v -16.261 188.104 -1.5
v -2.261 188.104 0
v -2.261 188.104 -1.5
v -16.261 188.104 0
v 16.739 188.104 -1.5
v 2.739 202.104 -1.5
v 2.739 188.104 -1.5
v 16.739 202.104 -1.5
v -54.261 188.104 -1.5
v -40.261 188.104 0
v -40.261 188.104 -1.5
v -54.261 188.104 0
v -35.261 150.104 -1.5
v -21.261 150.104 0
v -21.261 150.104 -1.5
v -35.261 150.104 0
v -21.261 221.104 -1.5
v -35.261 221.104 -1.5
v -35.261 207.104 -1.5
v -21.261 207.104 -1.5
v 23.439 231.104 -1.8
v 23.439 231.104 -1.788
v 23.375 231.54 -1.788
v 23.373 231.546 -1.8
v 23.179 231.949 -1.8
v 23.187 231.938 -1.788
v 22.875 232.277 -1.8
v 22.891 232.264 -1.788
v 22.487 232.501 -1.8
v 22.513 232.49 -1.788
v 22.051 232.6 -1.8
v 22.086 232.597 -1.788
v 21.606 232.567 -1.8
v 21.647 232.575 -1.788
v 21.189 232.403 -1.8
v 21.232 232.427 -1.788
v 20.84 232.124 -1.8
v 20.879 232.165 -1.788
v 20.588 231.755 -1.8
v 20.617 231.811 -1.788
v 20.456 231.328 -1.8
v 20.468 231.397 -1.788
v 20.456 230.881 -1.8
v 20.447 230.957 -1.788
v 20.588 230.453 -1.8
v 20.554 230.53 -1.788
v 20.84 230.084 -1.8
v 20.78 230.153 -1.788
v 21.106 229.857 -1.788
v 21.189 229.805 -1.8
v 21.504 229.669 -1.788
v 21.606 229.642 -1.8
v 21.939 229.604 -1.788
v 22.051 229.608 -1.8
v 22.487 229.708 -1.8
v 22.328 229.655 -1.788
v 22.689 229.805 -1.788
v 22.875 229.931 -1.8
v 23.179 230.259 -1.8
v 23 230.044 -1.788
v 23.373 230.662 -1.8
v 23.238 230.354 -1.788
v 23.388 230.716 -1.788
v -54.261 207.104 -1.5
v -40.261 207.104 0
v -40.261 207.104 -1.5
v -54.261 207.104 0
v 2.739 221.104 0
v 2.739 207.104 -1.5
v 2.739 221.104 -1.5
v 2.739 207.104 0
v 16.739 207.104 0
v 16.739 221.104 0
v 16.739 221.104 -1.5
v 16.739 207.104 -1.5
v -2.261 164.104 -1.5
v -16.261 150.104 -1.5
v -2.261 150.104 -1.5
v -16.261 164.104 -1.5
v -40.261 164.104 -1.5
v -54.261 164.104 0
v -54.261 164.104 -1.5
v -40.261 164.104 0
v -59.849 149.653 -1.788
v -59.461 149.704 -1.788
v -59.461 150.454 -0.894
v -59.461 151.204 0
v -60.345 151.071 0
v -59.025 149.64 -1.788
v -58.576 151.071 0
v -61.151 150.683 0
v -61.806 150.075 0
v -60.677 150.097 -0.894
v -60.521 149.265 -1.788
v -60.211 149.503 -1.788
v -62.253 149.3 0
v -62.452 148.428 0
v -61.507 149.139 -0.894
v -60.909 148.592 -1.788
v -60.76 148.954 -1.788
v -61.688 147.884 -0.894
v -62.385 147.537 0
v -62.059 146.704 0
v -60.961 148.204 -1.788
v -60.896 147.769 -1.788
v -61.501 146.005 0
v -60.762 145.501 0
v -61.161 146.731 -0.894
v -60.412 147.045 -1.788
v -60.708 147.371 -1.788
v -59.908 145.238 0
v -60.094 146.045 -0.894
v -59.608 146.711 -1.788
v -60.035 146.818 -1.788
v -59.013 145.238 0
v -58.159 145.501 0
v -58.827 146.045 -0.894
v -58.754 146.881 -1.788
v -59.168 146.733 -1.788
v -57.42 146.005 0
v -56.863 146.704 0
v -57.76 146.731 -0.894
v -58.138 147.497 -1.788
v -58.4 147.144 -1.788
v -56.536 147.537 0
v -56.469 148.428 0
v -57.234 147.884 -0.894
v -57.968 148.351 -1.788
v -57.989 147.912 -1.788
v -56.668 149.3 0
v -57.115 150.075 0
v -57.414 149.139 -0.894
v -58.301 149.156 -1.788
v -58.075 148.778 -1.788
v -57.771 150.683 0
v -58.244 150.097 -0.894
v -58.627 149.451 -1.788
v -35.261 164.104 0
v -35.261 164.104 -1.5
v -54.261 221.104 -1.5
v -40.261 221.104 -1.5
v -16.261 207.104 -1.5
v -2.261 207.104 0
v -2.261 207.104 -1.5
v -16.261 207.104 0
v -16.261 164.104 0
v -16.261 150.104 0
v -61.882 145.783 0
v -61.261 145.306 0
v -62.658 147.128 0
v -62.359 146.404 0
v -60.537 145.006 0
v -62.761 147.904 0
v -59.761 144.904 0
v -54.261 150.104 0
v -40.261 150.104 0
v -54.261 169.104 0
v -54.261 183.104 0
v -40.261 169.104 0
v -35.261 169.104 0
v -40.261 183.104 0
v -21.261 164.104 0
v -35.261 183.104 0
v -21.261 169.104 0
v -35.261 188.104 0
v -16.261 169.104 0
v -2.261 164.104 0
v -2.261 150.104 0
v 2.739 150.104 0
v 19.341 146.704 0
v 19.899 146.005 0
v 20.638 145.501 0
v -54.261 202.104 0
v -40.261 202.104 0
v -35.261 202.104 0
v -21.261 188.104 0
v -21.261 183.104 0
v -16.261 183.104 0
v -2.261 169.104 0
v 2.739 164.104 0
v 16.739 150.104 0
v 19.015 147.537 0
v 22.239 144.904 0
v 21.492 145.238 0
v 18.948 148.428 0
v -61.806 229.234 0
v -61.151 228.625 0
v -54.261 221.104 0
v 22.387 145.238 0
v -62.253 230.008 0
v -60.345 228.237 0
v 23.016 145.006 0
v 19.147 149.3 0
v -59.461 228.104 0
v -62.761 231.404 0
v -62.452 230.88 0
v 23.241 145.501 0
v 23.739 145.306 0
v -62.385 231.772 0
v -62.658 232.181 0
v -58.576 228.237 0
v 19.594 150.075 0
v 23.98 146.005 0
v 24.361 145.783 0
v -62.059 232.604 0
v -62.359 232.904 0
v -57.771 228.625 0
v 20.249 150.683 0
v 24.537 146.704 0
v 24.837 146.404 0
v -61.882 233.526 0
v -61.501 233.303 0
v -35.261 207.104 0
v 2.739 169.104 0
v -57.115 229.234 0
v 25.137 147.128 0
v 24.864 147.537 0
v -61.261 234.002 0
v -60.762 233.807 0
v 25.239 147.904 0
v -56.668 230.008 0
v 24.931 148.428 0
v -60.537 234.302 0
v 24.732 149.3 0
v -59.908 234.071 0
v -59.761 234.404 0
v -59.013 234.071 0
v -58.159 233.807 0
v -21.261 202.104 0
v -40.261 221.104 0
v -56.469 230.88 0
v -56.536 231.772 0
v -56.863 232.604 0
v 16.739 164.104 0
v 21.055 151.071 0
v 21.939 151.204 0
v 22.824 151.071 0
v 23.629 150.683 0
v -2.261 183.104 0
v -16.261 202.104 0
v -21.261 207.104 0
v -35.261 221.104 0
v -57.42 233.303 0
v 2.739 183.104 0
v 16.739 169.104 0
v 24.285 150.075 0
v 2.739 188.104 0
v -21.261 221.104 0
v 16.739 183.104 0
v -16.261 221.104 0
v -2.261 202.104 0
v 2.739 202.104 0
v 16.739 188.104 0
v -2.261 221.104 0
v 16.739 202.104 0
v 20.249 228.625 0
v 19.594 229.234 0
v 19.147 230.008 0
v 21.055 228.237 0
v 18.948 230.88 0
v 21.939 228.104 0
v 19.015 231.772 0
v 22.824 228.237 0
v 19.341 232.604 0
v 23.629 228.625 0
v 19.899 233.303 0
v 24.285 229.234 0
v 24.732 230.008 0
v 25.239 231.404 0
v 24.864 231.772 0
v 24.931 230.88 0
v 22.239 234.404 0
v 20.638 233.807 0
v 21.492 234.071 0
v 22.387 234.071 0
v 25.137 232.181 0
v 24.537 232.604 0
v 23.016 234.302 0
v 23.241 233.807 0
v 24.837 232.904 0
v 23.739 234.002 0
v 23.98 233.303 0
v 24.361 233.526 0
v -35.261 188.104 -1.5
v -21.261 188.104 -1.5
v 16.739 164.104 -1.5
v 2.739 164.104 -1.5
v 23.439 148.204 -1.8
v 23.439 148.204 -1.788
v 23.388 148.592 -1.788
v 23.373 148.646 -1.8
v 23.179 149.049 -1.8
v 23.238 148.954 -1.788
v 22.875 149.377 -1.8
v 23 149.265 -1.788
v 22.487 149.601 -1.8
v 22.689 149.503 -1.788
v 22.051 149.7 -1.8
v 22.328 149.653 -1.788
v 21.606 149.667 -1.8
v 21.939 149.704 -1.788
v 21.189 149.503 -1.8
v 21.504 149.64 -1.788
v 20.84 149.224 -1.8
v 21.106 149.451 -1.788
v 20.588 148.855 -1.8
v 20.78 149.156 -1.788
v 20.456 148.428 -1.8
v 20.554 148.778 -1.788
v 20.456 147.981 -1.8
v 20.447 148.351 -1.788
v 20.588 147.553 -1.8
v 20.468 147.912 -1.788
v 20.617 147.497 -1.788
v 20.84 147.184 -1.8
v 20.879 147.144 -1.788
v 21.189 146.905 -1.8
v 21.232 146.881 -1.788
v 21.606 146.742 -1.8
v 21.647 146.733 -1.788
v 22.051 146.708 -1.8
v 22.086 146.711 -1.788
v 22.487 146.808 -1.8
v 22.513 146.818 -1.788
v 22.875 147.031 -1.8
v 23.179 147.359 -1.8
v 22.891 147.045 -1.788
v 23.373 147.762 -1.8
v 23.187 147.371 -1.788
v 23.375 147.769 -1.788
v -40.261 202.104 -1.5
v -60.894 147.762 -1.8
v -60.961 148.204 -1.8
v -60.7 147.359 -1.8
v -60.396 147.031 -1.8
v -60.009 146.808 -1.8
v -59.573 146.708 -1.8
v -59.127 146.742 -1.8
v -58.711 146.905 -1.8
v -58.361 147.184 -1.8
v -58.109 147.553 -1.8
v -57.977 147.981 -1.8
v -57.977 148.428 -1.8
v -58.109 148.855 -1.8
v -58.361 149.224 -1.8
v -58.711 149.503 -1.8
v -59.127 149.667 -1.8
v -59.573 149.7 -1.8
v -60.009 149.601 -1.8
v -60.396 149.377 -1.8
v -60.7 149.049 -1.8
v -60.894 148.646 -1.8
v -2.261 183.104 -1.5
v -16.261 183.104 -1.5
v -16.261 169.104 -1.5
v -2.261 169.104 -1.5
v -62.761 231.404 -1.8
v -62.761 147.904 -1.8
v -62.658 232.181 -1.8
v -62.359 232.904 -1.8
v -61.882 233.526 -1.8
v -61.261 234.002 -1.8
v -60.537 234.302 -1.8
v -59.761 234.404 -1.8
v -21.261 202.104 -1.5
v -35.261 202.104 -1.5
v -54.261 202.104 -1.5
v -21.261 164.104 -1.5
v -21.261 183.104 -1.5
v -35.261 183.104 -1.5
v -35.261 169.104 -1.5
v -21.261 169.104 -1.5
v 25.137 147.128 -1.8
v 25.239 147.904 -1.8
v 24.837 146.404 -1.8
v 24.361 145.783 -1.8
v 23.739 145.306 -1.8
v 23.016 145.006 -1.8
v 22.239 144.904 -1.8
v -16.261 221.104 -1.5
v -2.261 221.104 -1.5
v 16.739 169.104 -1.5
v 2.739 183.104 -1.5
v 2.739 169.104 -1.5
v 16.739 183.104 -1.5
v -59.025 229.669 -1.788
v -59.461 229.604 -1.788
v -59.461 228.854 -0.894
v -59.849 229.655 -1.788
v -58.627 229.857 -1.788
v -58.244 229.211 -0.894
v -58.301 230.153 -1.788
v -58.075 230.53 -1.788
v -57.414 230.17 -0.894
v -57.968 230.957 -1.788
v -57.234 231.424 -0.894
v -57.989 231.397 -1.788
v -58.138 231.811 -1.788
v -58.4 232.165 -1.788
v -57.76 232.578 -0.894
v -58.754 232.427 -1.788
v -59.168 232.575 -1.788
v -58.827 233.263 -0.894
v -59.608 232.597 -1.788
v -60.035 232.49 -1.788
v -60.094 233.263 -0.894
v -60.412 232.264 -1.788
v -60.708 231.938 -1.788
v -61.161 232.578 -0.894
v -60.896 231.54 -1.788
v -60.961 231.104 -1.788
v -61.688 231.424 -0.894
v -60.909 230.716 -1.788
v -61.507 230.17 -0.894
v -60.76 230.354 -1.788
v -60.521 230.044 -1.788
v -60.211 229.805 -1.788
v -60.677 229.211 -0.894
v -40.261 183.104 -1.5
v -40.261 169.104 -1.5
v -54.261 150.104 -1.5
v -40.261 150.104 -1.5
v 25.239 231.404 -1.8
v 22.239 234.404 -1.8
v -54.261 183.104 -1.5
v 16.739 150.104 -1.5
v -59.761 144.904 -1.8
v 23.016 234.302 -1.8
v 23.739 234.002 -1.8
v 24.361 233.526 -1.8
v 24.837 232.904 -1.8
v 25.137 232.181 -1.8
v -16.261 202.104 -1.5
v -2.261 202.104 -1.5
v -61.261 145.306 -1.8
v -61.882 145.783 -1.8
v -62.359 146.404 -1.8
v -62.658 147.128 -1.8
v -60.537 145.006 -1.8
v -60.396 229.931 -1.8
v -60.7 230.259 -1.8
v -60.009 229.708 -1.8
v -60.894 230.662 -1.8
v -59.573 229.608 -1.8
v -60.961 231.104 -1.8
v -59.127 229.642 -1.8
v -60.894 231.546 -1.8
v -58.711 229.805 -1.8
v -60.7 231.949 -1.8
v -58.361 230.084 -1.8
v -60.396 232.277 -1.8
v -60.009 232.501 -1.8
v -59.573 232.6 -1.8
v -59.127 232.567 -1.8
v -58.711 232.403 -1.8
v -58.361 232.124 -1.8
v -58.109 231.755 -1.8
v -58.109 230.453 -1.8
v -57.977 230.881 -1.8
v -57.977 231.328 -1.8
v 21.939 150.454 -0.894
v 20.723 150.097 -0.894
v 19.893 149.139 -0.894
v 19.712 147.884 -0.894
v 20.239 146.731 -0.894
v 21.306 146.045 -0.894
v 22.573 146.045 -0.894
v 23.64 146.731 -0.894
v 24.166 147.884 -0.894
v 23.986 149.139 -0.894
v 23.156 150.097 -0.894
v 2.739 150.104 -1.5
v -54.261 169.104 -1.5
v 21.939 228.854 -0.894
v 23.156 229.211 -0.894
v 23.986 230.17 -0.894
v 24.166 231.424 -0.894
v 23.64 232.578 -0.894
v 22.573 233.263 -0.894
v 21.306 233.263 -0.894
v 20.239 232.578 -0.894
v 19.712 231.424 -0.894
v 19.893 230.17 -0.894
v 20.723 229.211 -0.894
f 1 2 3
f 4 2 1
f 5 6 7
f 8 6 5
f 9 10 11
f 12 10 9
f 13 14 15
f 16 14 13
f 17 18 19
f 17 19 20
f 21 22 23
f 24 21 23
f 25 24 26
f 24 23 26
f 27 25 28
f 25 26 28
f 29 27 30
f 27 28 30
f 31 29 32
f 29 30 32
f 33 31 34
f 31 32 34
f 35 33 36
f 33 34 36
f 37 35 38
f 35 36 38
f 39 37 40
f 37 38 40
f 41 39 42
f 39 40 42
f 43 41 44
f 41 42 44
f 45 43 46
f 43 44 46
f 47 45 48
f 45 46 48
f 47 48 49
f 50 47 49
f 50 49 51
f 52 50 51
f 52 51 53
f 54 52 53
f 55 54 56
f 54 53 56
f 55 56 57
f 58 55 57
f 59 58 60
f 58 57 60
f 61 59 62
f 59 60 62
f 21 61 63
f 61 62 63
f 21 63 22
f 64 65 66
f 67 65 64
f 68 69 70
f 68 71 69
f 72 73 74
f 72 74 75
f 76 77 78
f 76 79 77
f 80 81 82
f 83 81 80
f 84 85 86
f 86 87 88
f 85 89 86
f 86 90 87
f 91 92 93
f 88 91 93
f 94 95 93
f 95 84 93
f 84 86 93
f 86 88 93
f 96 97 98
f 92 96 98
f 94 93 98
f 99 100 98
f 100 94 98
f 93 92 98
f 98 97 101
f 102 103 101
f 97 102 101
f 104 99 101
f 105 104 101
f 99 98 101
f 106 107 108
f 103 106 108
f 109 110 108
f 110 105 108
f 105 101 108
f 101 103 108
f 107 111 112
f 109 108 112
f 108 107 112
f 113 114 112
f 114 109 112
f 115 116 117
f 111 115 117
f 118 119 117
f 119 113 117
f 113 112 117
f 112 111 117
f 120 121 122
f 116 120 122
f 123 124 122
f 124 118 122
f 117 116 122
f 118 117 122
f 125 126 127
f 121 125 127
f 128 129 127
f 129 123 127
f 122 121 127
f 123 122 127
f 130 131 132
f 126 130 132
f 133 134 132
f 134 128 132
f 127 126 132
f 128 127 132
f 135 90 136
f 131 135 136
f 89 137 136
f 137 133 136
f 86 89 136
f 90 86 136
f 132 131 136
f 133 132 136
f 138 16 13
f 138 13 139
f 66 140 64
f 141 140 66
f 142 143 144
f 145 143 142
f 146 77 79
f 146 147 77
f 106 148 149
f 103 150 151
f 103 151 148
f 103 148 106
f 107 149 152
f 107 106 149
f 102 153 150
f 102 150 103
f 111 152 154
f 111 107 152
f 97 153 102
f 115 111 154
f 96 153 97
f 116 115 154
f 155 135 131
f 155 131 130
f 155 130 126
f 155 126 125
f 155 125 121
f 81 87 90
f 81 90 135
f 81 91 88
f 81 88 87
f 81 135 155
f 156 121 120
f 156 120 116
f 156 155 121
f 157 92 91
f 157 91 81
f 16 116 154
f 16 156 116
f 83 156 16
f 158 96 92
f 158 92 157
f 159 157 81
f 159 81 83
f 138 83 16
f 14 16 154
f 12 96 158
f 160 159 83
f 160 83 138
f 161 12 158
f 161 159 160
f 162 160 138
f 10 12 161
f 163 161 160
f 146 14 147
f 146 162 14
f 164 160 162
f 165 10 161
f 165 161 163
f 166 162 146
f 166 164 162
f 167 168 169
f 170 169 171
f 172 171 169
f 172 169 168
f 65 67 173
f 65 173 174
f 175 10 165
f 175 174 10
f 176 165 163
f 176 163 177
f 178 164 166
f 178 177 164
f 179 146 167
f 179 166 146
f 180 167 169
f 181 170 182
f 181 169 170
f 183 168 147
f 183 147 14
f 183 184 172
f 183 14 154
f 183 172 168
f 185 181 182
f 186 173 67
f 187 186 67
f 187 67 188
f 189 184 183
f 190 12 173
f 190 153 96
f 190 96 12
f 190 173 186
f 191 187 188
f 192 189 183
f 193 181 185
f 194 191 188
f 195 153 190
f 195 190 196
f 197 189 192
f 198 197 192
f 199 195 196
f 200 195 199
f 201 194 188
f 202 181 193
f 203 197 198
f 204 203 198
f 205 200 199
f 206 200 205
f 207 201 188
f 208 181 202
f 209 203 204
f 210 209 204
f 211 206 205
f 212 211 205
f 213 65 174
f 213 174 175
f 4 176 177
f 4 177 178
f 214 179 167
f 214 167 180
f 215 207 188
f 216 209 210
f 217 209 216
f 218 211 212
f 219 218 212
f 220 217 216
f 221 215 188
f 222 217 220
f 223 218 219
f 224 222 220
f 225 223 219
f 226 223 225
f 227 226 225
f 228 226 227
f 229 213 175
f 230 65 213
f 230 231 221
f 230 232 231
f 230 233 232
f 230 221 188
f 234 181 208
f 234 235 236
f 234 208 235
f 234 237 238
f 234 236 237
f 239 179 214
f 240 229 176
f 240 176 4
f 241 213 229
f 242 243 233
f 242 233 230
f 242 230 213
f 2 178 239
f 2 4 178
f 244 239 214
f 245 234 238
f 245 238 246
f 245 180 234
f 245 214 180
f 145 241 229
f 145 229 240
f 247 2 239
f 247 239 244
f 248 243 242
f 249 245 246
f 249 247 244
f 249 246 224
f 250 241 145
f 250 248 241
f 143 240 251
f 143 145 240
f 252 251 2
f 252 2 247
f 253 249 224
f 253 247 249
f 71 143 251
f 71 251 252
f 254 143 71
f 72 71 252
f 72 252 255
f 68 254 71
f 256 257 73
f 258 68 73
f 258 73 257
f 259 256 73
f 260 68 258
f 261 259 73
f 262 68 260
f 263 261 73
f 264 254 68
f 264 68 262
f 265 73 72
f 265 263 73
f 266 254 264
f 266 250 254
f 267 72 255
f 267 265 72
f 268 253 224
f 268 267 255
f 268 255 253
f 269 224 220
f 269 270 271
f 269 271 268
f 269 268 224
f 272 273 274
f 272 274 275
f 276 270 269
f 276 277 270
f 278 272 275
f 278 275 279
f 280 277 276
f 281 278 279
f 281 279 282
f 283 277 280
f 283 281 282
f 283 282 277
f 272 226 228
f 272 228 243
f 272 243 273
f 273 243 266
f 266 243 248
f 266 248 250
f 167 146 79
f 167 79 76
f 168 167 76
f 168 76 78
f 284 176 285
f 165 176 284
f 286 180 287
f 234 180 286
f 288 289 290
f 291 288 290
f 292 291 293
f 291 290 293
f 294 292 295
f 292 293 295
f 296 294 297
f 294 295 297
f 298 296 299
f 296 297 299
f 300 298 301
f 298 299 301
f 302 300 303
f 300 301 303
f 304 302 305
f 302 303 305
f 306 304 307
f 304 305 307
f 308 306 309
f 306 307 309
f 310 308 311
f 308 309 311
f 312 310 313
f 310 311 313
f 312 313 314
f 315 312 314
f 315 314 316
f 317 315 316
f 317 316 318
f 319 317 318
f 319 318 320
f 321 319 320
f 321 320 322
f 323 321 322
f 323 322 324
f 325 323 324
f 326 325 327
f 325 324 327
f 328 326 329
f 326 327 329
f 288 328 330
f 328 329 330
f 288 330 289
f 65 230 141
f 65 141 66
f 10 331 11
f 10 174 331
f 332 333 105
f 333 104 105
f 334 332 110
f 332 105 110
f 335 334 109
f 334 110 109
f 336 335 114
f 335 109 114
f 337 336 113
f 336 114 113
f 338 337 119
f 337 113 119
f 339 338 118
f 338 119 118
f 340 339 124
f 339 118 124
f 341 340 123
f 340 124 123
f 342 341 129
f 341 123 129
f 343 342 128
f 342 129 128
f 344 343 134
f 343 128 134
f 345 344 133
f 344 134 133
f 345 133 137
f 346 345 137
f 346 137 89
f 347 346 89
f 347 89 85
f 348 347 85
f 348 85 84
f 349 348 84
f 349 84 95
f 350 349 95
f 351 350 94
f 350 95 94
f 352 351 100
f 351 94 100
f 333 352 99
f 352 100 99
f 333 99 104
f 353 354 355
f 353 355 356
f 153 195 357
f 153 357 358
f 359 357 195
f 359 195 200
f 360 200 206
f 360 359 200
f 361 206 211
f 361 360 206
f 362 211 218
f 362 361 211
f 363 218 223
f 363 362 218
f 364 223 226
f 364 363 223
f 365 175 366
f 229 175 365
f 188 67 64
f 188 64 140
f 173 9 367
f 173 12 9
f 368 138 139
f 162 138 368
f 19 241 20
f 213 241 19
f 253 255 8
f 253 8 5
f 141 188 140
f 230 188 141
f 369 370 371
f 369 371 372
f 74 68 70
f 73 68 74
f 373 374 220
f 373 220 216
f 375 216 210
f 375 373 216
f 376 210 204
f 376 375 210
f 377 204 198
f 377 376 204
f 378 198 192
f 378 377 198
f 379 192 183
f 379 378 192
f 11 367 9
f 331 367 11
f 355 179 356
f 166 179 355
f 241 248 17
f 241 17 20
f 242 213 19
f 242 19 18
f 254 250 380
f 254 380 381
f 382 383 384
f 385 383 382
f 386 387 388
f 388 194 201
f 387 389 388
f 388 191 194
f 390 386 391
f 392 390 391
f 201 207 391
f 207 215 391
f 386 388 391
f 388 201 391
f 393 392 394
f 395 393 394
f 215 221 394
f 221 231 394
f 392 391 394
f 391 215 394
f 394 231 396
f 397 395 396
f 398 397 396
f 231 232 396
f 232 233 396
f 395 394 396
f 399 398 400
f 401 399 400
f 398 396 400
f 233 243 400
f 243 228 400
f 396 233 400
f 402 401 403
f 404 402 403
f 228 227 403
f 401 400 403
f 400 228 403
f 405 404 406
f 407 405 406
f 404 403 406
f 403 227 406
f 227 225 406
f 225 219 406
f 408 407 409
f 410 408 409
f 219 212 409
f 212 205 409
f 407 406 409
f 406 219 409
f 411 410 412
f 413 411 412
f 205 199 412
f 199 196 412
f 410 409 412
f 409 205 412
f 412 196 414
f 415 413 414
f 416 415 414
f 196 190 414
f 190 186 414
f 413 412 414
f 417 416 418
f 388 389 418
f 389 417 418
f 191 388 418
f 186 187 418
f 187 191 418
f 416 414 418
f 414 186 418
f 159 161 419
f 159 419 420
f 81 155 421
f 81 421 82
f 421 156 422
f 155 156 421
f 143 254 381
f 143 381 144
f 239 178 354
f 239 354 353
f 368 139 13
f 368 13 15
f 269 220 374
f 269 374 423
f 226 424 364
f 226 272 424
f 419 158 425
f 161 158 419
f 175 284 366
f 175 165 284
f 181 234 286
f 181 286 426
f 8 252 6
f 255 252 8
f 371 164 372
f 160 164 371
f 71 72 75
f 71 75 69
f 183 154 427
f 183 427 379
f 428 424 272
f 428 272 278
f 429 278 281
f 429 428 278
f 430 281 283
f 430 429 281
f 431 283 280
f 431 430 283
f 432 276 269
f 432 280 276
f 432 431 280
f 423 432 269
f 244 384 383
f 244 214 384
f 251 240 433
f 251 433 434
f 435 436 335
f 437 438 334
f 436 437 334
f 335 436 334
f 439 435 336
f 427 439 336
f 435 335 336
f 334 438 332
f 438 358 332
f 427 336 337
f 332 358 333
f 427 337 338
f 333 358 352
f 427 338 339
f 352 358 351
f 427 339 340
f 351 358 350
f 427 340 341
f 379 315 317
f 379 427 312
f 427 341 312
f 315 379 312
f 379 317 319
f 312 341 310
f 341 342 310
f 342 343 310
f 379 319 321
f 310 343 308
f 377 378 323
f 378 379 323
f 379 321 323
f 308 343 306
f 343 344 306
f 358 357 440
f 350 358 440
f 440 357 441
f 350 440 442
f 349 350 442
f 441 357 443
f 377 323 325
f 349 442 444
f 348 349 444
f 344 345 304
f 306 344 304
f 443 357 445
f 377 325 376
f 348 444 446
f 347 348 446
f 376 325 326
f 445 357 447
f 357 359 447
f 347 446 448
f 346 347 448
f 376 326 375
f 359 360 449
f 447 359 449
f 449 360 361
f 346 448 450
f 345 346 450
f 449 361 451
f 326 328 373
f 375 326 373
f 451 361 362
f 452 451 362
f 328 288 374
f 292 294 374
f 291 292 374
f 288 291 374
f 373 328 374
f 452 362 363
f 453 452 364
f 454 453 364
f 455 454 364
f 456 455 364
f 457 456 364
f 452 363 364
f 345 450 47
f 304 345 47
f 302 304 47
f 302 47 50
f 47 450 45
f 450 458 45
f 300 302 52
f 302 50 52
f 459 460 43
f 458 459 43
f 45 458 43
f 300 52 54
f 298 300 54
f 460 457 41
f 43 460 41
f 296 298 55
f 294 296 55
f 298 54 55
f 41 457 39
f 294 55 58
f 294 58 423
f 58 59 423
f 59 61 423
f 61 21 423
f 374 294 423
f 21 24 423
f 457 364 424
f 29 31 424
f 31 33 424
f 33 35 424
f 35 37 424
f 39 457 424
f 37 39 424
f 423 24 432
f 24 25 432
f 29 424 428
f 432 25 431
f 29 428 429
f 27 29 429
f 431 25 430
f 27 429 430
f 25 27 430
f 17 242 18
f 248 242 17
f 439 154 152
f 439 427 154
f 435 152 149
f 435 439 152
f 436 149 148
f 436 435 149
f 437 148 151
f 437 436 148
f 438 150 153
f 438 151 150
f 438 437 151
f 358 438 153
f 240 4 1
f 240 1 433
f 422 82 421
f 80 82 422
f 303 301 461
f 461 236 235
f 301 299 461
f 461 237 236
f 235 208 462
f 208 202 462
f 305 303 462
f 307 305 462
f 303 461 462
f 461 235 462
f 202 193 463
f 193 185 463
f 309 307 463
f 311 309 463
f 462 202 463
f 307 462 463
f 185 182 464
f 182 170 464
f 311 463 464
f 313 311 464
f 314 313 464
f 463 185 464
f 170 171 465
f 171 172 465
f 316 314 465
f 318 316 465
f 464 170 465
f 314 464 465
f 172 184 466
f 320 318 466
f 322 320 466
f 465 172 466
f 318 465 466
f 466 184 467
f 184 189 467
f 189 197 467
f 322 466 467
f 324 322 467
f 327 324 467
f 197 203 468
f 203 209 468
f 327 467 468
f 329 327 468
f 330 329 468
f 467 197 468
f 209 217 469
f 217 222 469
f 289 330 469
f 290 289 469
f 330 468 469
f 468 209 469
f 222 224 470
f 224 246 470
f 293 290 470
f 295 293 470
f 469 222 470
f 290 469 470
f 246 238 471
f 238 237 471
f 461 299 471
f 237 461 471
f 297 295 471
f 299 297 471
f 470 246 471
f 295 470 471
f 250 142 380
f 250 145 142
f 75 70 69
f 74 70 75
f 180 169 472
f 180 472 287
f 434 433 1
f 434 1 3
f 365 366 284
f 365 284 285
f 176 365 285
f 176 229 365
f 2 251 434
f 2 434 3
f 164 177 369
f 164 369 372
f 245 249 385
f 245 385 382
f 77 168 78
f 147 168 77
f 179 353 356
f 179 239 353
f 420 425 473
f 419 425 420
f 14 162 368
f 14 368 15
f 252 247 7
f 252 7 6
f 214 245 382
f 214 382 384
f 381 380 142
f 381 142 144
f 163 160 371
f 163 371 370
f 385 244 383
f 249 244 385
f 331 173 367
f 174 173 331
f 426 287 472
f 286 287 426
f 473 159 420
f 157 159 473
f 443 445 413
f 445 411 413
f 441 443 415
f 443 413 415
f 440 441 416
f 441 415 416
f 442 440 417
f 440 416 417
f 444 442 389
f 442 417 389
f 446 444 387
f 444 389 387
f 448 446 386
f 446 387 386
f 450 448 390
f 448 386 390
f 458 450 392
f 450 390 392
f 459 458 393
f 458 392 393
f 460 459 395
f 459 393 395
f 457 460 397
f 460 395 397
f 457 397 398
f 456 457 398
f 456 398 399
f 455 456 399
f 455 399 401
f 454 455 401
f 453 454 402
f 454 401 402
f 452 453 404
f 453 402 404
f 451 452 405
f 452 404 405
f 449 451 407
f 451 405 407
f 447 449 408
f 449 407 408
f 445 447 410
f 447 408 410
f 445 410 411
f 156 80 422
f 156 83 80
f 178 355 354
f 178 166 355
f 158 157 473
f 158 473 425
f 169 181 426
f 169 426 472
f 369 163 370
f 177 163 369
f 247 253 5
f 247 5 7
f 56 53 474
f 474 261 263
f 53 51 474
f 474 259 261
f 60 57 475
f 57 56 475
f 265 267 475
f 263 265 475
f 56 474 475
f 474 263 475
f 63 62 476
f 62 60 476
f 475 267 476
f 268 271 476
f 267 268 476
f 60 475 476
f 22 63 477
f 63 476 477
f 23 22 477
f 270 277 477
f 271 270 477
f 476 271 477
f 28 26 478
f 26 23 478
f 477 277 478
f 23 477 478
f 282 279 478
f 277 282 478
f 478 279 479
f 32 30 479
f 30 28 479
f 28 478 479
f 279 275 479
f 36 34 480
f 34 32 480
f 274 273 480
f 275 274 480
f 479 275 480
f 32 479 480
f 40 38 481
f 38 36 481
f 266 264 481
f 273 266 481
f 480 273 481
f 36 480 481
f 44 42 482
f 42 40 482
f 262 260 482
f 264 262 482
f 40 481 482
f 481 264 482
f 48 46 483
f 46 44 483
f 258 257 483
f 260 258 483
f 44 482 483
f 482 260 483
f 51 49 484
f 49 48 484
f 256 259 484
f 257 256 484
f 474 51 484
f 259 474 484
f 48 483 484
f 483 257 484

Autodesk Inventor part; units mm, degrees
ref_plane "YZ Plane" through (0, 0, 0) normal (1, 0, 0) x (0, 1, 0)
ref_plane "XZ Plane" through (0, 0, 0) normal (0, 1, 0) x (-1, 0, 0)
ref_plane "XY Plane" through (0, 0, 0) normal (0, 0, 1) x (1, 0, 0)
ref_plane "Work Plane1" through (0, 0, 0) normal (0, 0, 1) x (1, 0, 0)
sketch "Sketch1" plane through (0, 0, 0) normal (0, 0, 1) x (1, 0, 0)
  line L0 (25.2394, 234.4042) -> (-62.7606, 234.4042)
  line L1 (-62.7606, 234.4042) -> (-62.7606, 144.9042)
  line L2 (-62.7606, 144.9042) -> (25.2394, 144.9042)
  line L3 (25.2394, 144.9042) -> (25.2394, 234.4042)
  line L4 (23.4394, 232.6042) -> (-60.9606, 232.6042)
  line L5 (-60.9606, 232.6042) -> (-60.9606, 146.7042)
  line L6 (-60.9606, 146.7042) -> (23.4394, 146.7042)
  line L7 (23.4394, 146.7042) -> (23.4394, 232.6042)
  circle A0 centre (21.9394, 231.1042) radius 3.3
  circle A1 centre (21.9394, 231.1042) radius 1.5
  line L8 (-18.7606, 249.1641) -> (-18.7606, 136.0401)
  line L9 (-67.3062, 189.6542) -> (41.0259, 189.6542)
  circle A2 centre (-59.4606, 231.1042) radius 3.3
  circle A3 centre (-59.4606, 231.1042) radius 1.5
  circle A4 centre (21.9394, 148.2042) radius 3.3
  circle A5 centre (21.9394, 148.2042) radius 1.5
  circle A6 centre (-59.4606, 148.2042) radius 3.3
  circle A7 centre (-59.4606, 148.2042) radius 1.5
  line L10 (2.7394, 221.1042) -> (16.7394, 221.1042)
  line L11 (16.7394, 221.1042) -> (16.7394, 207.1042)
  line L12 (16.7394, 207.1042) -> (2.7394, 207.1042)
  line L13 (2.7394, 207.1042) -> (2.7394, 221.1042)
  line L14 (-16.2606, 221.1042) -> (-2.2606, 221.1042)
  line L15 (-2.2606, 221.1042) -> (-2.2606, 207.1042)
  line L16 (-2.2606, 207.1042) -> (-16.2606, 207.1042)
  line L17 (-16.2606, 207.1042) -> (-16.2606, 221.1042)
  line L18 (2.7394, 202.1042) -> (16.7394, 202.1042)
  line L19 (16.7394, 202.1042) -> (16.7394, 188.1042)
  line L20 (16.7394, 188.1042) -> (2.7394, 188.1042)
  line L21 (2.7394, 188.1042) -> (2.7394, 202.1042)
  line L22 (-16.2606, 202.1042) -> (-2.2606, 202.1042)
  line L23 (-2.2606, 202.1042) -> (-2.2606, 188.1042)
  line L24 (-2.2606, 188.1042) -> (-16.2606, 188.1042)
  line L25 (-16.2606, 188.1042) -> (-16.2606, 202.1042)
  line L26 (2.7394, 183.1042) -> (16.7394, 183.1042)
  line L27 (16.7394, 183.1042) -> (16.7394, 169.1042)
  line L28 (16.7394, 169.1042) -> (2.7394, 169.1042)
  line L29 (2.7394, 169.1042) -> (2.7394, 183.1042)
  line L30 (-2.2606, 169.1042) -> (-16.2606, 169.1042)
  line L31 (-16.2606, 169.1042) -> (-16.2606, 183.1042)
  line L32 (-16.2606, 183.1042) -> (-2.2606, 183.1042)
  line L33 (-2.2606, 183.1042) -> (-2.2606, 169.1042)
  line L34 (16.7394, 150.1042) -> (2.7394, 150.1042)
  line L35 (2.7394, 150.1042) -> (2.7394, 164.1042)
  line L36 (2.7394, 164.1042) -> (16.7394, 164.1042)
  line L37 (16.7394, 164.1042) -> (16.7394, 150.1042)
  line L38 (-2.2606, 150.1042) -> (-16.2606, 150.1042)
  line L39 (-16.2606, 150.1042) -> (-16.2606, 164.1042)
  line L40 (-16.2606, 164.1042) -> (-2.2606, 164.1042)
  line L41 (-2.2606, 164.1042) -> (-2.2606, 150.1042)
  line L42 (-35.2606, 221.1042) -> (-21.2606, 221.1042)
  line L43 (-21.2606, 221.1042) -> (-21.2606, 207.1042)
  line L44 (-21.2606, 207.1042) -> (-35.2606, 207.1042)
  line L45 (-35.2606, 207.1042) -> (-35.2606, 221.1042)
  line L46 (-40.2606, 207.1042) -> (-54.2606, 207.1042)
  line L47 (-54.2606, 207.1042) -> (-54.2606, 221.1042)
  line L48 (-54.2606, 221.1042) -> (-40.2606, 221.1042)
  line L49 (-40.2606, 221.1042) -> (-40.2606, 207.1042)
  line L50 (-21.2606, 188.1042) -> (-35.2606, 188.1042)
  line L51 (-35.2606, 188.1042) -> (-35.2606, 202.1042)
  line L52 (-35.2606, 202.1042) -> (-21.2606, 202.1042)
  line L53 (-21.2606, 202.1042) -> (-21.2606, 188.1042)
  line L54 (-40.2606, 188.1042) -> (-54.2606, 188.1042)
  line L55 (-54.2606, 188.1042) -> (-54.2606, 202.1042)
  line L56 (-54.2606, 202.1042) -> (-40.2606, 202.1042)
  line L57 (-40.2606, 202.1042) -> (-40.2606, 188.1042)
  line L58 (-40.2606, 150.1042) -> (-54.2606, 150.1042)
  line L59 (-54.2606, 164.1042) -> (-40.2606, 164.1042)
  line L60 (-54.2606, 150.1042) -> (-54.2606, 164.1042)
  line L61 (-40.2606, 164.1042) -> (-40.2606, 150.1042)
  line L62 (-35.2606, 150.1042) -> (-35.2606, 164.1042)
  line L63 (-35.2606, 164.1042) -> (-21.2606, 164.1042)
  line L64 (-21.2606, 150.1042) -> (-35.2606, 150.1042)
  line L65 (-21.2606, 164.1042) -> (-21.2606, 150.1042)
  line L66 (-21.2606, 169.1042) -> (-35.2606, 169.1042)
  line L67 (-40.2606, 169.1042) -> (-54.2606, 169.1042)
  line L68 (-35.2606, 183.1042) -> (-21.2606, 183.1042)
  line L69 (-21.2606, 183.1042) -> (-21.2606, 169.1042)
  line L70 (-35.2606, 169.1042) -> (-35.2606, 183.1042)
  line L71 (-40.2606, 183.1042) -> (-40.2606, 169.1042)
  line L72 (-54.2606, 183.1042) -> (-40.2606, 183.1042)
  line L73 (-54.2606, 169.1042) -> (-54.2606, 183.1042)
  point P0 (-18.7606, 189.6542)
  point P1 (-18.7606, 234.4042)
  point P2 (-18.7606, 189.6542)
  point P3 (25.2394, 189.6542)
  dimension "d0" = 88
  dimension "d1" = 89.5
  dimension "d2" = 84.4
  dimension "d3" = 85.9
  dimension "d4" = 1.8
  dimension "d5" = 1.8
  dimension "d6" = 6.6
  dimension "d7" = 3.3
  dimension "d8" = 3.3
  dimension "d9" = 3
  dimension "d12" = 44.75
  dimension "d13" = 44
  dimension "d70" = 84.4
  dimension "d71" = 85.9
  dimension "d81" = 14
  dimension "d82" = 14
  dimension "d83" = 14
  dimension "d84" = 14
  dimension "d85" = 5
  dimension "d86" = 14
  dimension "d87" = 14
  dimension "d88" = 5
  dimension "d89" = 14
  dimension "d90" = 14
  dimension "d91" = 5
  dimension "d92" = 5
  dimension "d93" = 14
  dimension "d94" = 14
  dimension "d95" = 14
  dimension "d96" = 14
  dimension "d97" = 5
  dimension "d98" = 14
  dimension "d99" = 14
  dimension "d100" = 5
  dimension "d101" = 14
  dimension "d102" = 14
  dimension "d103" = 5
  dimension "d104" = 5
  dimension "d105" = 5
  dimension "d106" = 5
  dimension "d107" = 11.5
  dimension "d108" = 11.5
  dimension "d109" = 14
  dimension "d110" = 14
  dimension "d111" = 14
  dimension "d112" = 14
  dimension "d113" = 5
  dimension "d114" = 14
  dimension "d115" = 14
  dimension "d116" = 5
  dimension "d117" = 14
  dimension "d118" = 14
  dimension "d119" = 5
  dimension "d120" = 5
  dimension "d121" = 14
  dimension "d122" = 14
  dimension "d123" = 14
  dimension "d124" = 14
  dimension "d125" = 5
  dimension "d126" = 14
  dimension "d127" = 14
  dimension "d128" = 5
  dimension "d129" = 14
  dimension "d130" = 14
extrude "Extrusion2" add sketch "Sketch1" against normal blind 1.8 contours L3 A0 L0 | A0 L4 L8 L0 | A0 L7 L4 | L3 L9 L7 A0 | A0 L7 L9 L19 L18 L21 L23 L22 L25 L8 L4 | L4 A1 L7 A0 | L4 L7 A1 | L9 L21 L18 L19 | L25 L22 L23 L9 | L10 L11 L12 L13 | L14 L15 L16 L17
hole "Hole2" at (21.9394, 231.1042, 0) direction (0, 0, -1) diameter 3 end through all countersink diameter 6 countersink angle 80
ref_plane "Work Plane4" through (-18.7606, 189.6542, -1.8) normal (1, 0, 0) x (0, 1, 0)
ref_plane "Work Plane5" through (-18.7606, 189.6542, 0) normal (0, -1, 0) x (1, 0, 0)
fillet "Fillet3" radius 3 1 edges at (25.2394, 234.4042, -0.9)
mirror "Mirror5" about plane through (-18.7606, 189.6542, 0) normal (0, -1, 0)
mirror "Mirror6" about plane through (-18.7606, 189.6542, -1.8) normal (1, 0, 0)
extrude "Extrusion3" cut sketch "Sketch1" against normal blind 1.5 contours L19 L20 L21 L9 | L9 L21 L18 L19 | L53 L50 L51 L9 | L9 L51 L52 L53 | L25 L22 L23 L9 | L9 L23 L24 L25 | L55 L56 L57 L9 | L9 L57 L54 L55 | L10 L11 L12 L13 | L14 L15 L16 L17 | L26 L27 L28 L29 | L30 L31 L32 L33 | L34 L35 L36 L37 | L38 L39 L40 L41 | L42 L43 L44 L45 | L46 L47 L48 L49 | L58 L60 L59 L61 | L62 L63 L65 L64 | L66 L70 L68 L69 | L67 L73 L72 L71
equation "\"d2\" = d0 - 2 * d4"
equation "\"d3\" = d1 - 2 * d5"
equation "\"d5\" = d4"
equation "\"d6\" = 2 * d4 + d9"
equation "\"d7\" = 0.5 * d6"
equation "\"d8\" = 0.5 * d6"
equation "\"d12\" = 0.5 * d1"
equation "\"d13\" = 0.5 * d0"
properties part number "plate"
